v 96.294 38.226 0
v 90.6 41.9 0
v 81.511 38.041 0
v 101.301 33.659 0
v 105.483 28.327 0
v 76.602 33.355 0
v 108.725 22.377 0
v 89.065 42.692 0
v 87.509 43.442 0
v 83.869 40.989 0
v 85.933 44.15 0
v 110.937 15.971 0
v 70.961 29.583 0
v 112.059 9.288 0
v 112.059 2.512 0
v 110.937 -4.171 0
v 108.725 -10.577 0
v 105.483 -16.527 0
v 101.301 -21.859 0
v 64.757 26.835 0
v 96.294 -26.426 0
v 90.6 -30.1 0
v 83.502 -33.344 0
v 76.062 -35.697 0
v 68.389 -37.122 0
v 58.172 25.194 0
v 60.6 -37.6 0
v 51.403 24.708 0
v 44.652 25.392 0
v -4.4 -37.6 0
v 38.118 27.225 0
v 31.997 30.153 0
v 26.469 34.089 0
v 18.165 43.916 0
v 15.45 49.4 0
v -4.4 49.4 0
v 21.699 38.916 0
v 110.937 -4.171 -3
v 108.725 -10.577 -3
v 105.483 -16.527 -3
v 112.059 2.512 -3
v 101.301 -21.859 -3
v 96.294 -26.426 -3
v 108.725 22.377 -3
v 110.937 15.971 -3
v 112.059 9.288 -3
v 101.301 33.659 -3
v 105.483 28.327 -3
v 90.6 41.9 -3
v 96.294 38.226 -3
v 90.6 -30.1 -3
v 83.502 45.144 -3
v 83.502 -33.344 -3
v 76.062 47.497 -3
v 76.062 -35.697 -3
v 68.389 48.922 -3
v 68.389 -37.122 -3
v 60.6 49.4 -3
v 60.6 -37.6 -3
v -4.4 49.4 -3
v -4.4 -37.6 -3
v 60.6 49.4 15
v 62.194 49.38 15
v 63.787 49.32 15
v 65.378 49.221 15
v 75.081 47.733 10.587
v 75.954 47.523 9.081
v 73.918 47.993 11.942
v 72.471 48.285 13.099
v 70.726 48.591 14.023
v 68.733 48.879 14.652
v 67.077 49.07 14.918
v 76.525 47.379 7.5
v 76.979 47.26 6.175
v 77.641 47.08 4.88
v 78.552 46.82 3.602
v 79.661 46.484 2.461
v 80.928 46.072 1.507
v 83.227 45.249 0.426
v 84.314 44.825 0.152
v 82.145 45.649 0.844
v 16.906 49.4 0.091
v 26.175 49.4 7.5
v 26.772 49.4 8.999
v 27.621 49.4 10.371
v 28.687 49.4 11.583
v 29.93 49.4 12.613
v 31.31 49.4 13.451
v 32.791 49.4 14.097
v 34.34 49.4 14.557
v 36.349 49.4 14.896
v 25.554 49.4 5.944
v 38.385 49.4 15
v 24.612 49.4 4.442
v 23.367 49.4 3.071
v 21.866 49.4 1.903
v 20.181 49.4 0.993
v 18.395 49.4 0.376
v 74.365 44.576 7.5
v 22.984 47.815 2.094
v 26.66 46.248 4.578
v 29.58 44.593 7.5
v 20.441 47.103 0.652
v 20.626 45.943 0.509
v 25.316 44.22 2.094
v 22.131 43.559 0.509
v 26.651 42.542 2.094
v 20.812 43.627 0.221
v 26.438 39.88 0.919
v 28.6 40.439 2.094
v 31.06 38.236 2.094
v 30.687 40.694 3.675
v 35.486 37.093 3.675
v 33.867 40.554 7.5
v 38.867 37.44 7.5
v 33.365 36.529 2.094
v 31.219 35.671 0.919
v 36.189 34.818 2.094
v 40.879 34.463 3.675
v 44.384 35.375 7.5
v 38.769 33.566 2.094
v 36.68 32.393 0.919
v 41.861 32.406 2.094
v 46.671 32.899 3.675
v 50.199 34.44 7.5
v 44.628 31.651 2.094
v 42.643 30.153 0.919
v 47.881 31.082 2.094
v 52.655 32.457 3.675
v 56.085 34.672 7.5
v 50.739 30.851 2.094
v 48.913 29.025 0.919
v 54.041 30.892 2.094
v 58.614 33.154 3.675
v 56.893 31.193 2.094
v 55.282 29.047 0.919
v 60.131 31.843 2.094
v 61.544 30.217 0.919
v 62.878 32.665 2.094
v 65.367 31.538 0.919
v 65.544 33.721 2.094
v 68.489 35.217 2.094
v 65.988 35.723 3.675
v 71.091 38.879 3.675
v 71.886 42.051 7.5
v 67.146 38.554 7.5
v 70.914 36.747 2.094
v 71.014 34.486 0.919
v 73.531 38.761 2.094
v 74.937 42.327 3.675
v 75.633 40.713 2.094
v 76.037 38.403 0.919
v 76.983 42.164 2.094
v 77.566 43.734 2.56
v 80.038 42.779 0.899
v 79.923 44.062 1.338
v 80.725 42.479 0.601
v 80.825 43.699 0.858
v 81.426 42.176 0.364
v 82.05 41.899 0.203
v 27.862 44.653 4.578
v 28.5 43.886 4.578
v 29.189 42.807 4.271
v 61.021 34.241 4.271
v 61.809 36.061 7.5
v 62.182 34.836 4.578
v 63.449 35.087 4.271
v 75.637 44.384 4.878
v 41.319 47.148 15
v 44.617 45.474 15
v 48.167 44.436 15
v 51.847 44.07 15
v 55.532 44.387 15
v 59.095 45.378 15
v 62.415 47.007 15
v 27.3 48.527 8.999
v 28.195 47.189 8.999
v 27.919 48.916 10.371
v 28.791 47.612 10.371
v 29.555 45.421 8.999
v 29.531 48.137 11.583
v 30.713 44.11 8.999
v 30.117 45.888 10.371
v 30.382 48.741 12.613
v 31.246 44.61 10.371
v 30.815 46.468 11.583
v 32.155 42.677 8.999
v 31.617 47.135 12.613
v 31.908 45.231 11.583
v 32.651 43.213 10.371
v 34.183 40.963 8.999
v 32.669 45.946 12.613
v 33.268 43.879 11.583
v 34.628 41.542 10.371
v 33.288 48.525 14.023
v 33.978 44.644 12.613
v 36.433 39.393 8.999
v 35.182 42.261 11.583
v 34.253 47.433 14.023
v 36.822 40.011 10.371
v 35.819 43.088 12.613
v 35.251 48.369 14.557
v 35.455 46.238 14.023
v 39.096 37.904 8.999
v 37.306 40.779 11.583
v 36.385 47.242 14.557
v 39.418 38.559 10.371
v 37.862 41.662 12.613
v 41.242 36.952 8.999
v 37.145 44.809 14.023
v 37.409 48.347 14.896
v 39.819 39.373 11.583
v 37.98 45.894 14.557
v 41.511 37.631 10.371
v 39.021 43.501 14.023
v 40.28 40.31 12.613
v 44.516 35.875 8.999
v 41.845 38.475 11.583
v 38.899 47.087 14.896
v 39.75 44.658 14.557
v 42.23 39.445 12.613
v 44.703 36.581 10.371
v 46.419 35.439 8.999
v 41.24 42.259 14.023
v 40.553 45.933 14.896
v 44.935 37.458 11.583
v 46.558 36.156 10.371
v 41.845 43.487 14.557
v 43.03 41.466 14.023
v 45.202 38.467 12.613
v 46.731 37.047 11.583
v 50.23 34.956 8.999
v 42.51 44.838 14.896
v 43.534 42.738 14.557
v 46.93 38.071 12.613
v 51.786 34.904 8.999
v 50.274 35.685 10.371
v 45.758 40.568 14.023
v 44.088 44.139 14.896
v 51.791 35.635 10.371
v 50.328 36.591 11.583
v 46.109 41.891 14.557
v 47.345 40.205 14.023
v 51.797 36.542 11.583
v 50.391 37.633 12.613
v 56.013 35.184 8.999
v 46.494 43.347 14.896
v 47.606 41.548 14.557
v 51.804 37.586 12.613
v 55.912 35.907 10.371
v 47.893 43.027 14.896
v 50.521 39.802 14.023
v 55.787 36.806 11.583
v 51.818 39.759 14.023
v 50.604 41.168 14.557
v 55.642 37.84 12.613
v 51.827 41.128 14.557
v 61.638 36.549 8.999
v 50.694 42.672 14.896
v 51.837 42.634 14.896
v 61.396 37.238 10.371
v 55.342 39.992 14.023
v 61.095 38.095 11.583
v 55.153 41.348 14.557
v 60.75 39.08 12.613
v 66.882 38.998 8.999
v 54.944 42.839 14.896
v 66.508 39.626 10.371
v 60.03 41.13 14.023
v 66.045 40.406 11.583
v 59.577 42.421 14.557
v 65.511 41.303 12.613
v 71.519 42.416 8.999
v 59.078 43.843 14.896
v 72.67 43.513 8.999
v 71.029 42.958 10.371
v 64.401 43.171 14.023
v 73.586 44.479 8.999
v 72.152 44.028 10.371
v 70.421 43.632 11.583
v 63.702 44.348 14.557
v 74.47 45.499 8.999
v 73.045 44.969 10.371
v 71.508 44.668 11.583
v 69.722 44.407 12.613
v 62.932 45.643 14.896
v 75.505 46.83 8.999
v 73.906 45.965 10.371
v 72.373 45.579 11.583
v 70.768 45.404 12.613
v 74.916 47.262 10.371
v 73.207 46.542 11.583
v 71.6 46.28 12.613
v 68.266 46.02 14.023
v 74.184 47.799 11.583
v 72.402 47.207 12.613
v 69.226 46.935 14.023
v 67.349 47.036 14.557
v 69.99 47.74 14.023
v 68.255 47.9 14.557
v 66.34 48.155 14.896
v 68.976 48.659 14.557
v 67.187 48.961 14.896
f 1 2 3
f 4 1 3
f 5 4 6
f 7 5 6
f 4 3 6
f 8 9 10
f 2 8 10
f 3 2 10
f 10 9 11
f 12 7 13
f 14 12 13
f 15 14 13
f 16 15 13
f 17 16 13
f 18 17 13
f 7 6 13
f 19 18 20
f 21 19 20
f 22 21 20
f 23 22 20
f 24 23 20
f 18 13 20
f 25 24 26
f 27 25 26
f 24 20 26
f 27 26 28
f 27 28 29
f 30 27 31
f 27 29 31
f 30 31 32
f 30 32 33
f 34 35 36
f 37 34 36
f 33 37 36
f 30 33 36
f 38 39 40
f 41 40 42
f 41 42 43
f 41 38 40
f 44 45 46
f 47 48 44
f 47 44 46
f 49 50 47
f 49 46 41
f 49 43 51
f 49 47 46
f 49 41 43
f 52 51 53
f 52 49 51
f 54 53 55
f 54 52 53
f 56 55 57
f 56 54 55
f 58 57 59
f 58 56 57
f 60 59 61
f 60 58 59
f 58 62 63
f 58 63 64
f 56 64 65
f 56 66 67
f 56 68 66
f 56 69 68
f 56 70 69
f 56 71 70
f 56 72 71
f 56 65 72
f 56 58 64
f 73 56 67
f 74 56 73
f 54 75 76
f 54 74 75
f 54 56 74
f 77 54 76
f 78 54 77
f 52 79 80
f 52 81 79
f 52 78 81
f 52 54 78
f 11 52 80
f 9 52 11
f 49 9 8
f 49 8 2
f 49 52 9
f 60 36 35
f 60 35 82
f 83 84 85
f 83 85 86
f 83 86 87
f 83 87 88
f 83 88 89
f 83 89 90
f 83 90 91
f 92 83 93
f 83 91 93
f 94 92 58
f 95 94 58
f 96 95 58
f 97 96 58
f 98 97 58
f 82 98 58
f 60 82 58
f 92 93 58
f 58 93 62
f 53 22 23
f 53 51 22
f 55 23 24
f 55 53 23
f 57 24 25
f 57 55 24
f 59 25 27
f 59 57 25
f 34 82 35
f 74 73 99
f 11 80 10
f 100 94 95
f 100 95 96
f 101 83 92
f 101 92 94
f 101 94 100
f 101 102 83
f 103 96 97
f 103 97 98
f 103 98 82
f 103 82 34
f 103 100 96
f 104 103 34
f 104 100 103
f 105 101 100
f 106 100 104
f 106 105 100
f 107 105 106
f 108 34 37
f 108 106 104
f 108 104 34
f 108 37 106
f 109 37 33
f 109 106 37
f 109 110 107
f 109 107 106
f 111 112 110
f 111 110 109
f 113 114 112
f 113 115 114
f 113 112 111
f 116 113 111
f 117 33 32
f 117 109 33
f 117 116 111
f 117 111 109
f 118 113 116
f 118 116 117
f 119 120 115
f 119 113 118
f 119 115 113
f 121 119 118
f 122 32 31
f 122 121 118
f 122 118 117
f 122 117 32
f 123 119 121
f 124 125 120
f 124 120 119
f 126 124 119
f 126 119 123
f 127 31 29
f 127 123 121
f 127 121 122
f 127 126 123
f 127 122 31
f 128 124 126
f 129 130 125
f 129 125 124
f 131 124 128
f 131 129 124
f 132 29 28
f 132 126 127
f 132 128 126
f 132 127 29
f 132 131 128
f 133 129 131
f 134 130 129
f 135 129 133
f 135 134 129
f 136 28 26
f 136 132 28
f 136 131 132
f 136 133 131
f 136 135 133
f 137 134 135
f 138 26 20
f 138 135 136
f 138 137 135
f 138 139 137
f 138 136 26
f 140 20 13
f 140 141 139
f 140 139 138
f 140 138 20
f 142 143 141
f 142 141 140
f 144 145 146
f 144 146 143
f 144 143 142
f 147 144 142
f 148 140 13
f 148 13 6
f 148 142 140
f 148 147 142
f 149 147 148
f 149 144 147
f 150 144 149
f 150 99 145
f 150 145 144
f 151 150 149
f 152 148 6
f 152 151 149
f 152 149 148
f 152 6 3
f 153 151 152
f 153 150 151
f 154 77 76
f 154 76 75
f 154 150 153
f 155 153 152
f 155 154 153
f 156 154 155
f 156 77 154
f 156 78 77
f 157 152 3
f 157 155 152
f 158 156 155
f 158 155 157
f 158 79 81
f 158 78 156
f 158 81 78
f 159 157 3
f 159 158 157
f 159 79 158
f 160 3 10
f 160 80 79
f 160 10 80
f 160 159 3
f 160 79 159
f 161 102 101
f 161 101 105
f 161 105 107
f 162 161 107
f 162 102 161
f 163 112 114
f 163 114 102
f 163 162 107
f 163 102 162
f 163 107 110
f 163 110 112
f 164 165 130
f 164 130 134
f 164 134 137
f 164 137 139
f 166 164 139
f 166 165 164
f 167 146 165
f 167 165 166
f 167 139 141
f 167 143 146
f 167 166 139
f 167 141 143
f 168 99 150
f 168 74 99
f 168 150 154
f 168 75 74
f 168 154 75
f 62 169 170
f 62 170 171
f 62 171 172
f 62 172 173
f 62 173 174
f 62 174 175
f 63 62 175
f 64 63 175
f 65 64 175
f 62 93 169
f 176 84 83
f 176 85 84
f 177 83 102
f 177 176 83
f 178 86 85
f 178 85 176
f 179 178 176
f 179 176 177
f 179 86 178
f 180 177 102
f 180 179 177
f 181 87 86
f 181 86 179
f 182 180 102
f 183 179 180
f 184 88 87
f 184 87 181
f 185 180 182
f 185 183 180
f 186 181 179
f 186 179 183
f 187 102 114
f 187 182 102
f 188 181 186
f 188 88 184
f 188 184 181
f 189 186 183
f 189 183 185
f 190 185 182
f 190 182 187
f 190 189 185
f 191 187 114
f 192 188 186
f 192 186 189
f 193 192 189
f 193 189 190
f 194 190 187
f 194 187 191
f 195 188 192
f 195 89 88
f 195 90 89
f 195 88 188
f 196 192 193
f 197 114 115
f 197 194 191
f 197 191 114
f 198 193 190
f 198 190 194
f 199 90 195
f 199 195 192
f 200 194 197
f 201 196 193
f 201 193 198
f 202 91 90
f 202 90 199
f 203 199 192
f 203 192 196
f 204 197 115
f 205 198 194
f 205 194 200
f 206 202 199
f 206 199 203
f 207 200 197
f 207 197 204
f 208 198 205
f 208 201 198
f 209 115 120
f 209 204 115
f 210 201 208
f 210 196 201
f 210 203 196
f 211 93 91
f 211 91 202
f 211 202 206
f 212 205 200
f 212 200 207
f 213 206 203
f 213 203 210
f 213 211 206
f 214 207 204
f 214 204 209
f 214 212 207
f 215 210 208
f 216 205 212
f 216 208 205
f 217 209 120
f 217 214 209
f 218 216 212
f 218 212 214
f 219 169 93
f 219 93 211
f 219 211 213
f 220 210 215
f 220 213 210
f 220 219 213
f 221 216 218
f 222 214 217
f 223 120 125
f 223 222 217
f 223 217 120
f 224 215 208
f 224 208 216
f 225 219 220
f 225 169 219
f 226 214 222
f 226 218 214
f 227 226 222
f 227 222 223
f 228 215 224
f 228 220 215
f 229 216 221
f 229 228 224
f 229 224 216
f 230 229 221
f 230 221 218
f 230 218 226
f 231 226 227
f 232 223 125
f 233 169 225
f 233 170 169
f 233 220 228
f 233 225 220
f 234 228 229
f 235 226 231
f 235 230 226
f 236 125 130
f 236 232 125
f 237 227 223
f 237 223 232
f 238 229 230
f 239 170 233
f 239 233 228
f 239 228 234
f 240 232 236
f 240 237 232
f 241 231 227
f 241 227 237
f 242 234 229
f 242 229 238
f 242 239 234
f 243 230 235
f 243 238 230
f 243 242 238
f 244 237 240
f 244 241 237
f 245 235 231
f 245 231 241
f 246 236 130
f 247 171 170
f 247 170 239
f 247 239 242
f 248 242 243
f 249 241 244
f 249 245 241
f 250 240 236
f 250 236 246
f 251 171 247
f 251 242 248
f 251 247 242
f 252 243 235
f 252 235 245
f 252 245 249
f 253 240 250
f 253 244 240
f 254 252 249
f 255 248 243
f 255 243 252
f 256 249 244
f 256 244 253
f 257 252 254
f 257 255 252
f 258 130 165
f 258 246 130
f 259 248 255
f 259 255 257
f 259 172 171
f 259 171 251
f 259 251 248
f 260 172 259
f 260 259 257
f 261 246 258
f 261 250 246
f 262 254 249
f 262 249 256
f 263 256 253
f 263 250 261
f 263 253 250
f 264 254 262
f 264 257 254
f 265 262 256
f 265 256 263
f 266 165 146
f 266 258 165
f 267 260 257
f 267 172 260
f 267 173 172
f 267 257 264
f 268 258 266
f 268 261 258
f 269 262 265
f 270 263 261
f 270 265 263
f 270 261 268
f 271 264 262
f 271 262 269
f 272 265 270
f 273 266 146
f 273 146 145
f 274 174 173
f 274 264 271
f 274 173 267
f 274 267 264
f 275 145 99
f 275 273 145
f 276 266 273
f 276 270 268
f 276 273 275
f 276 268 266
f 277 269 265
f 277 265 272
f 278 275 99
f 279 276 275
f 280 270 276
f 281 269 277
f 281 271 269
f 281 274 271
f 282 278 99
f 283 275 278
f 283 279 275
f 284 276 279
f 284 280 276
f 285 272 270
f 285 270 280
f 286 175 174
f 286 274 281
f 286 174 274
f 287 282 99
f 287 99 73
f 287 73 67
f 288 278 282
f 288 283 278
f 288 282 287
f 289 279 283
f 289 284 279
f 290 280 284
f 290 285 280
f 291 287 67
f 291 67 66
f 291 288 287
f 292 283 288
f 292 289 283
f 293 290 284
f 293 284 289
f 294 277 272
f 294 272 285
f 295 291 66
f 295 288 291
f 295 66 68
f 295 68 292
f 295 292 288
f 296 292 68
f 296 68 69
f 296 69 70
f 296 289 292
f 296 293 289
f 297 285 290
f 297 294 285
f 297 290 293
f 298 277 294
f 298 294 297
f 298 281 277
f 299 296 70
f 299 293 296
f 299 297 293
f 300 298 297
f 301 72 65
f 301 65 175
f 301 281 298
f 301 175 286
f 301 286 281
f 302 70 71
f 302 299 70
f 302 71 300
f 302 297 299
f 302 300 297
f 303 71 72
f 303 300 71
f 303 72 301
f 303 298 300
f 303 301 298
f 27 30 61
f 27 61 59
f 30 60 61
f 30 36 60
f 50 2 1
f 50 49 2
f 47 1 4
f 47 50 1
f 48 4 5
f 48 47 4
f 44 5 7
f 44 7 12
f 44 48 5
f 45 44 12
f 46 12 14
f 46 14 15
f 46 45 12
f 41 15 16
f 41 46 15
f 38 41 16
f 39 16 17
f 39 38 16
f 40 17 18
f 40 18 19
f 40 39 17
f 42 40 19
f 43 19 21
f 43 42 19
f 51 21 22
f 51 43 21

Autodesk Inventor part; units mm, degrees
ref_plane "YZ Plane" through (0, 0, 0) normal (1, 0, 0) x (0, 1, 0)
ref_plane "XZ Plane" through (0, 0, 0) normal (0, 1, 0) x (-1, 0, 0)
ref_plane "XY Plane" through (0, 0, 0) normal (0, 0, 1) x (1, 0, 0)
sketch "Sketch1" plane through (0, 0, 0) normal (0, 0, 1) x (1, 0, 0)
  line L0 (-4.4, 49.4) -> (30, 49.4) projected
  line L1 (-4.4, -37.6) -> (30, -37.6) projected
  line L2 (-4.4, -37.6) -> (90.6, -37.6)
  line L3 (90.6, -37.6) -> (90.6, 49.4)
  line L4 (90.6, 49.4) -> (-4.4, 49.4)
  line L5 (-4.4, 49.4) -> (-4.4, -37.6)
  point P0 (0, 0)
  dimension "d0" = 95
extrude "Extrusion1" add sketch "Sketch1" against normal blind 3
sketch "Sketch2" plane through (90.6, -37.6, 0) normal (1, 0, 0) x (0, 0, -1)
  circle A0 centre (17.5922, 43.5) radius 28.5 construction
  point P0 (0, 37.6)
  dimension "d5" = 57
sketch "Sketch3" plane through (0, 0, 0) normal (0, 0, 1) x (1, 0, 0)
  line L0 (90.6, 49.4) -> (-4.4, 49.4) projected
  line L1 (-4.4, 49.4) -> (-4.4, -37.6) projected
  line L2 (-4.4, -37.6) -> (90.6, -37.6) projected
  line L3 (90.6, -37.6) -> (90.6, 49.4) projected
  line L4 (90.6, 49.4) -> (-4.4, 49.4) projected
  line L5 (-4.4, 49.4) -> (90.6, 49.4) projected
  arc A0 (25.8108, 49.4) -> (78.1488, 49.4) centre (51.9798, 64.0691) ccw
  point P0 (0, 0)
  point P1 (25.8108, 49.4)
  point P2 (78.1488, 49.4)
  dimension "d9" = 30
extrude "Extrusion2" add sketch "Sketch3" along normal blind 15 contours A0 L0
sketch "Sketch4" plane through (-4.4, 49.4, -3) normal (0, 1, 0) x (1, 0, 0)
  point P0 (4.4, -3)
fillet "Fillet2" radius 10 2 edges at (51.9798, 34.0691, 15) (51.9798, 34.0691, 0)
sketch "Sketch7" plane through (0, 0, -3) normal (0, 0, -1) x (-1, 0, 0)
  line L0 (4.4, 49.4) -> (-90.6, 49.4) projected
  line L1 (-90.6, 49.4) -> (-90.6, -37.6) projected
  line L2 (-90.6, -37.6) -> (4.4, -37.6) projected
  line L3 (4.4, -37.6) -> (4.4, 49.4) projected
  line L4 (-90.6, -37.6) -> (4.4, -37.6) projected
  arc A0 (-90.6, -30.1) -> (-60.6, -37.6) centre (-60.6, 26.15) ccw
  line L5 (-90.6, 49.4) -> (-90.6, -37.6) projected
  line L6 (-90.6, 5.9) -> (-40.6, 5.9) construction
  arc A1 (-60.6, 49.4) -> (-90.6, 41.9) centre (-60.6, -14.35) ccw
  point P0 (0, 0)
  point P1 (-60.6, -37.6)
  dimension "d11" = 30
  dimension "d12" = 7.5
  dimension "d13" = 50
extrude "Extrusion3" cut sketch "Sketch7" against normal through all contours A1 L1 L0 | L2 L1 A0
sketch "Sketch8" plane through (0, 0, -3) normal (0, 0, -1) x (-1, 0, 0)
  arc A0 (-60.6, 49.4) -> (-90.6, 41.9) centre (-60.6, -14.35) ccw projected
  line L0 (-90.6, 41.9) -> (-90.6, -30.1) projected
  arc A1 (-90.6, -30.1) -> (-60.6, -37.6) centre (-60.6, 26.15) ccw projected
  line L1 (-60.6, -37.6) -> (4.4, -37.6) projected
  line L2 (4.4, -37.6) -> (4.4, 49.4) projected
  line L3 (4.4, 49.4) -> (-60.6, 49.4) projected
  arc A2 (-90.6, -30.1) -> (-60.6, -37.6) centre (-60.6, 26.15) ccw projected
  arc A3 (-90.6, 41.9) -> (-90.6, -30.1) centre (-71.4, 5.9) ccw
  point P0 (0, 0)
extrude "Extrusion4" add sketch "Sketch8" against normal blind 3 contours L0 A3
sketch "Sketch9" plane through (0, 0, -3) normal (0, 0, -1) x (-1, 0, 0)
  line L0 (-52.7475, -27.5099) -> (-72.7475, -27.5099)
  line L1 (-72.7475, -27.5099) -> (-72.7475, -34.5099)
  line L2 (-72.7475, -34.5099) -> (-52.7475, -34.5099)
  line L3 (-52.7475, -34.5099) -> (-52.7475, -27.5099)
  line L4 (4.4, -37.6) -> (4.4, 49.4) projected
  line L5 (4.4, 5.9) -> (-145.6, 5.9) construction
  line L6 (-52.7475, 39.3099) -> (-72.7475, 39.3099)
  line L7 (-72.7475, 39.3099) -> (-72.7475, 46.3099)
  line L8 (-72.7475, 46.3099) -> (-52.7475, 46.3099)
  line L9 (-52.7475, 46.3099) -> (-52.7475, 39.3099)
  point P0 (0, 0)
  dimension "d19" = 20
  dimension "d20" = 7
  dimension "d21" = 150
extrude "Extrusion5" [suppressed]
sketch "Sketch10" plane through (0, 0, 0) normal (0, 0, 1) x (1, 0, 0)
  line L0 (0.15, 35.15) -> (22.95, 35.15) projected
  line L1 (6.4671, 26.3395) -> (10.4671, 29.307) projected
  line L2 (-4.4, 32.9) -> (30, 32.9) projected
  arc A0 (90.6, 41.9) -> (85.9332, 44.1503) centre (60.6, -14.35) ccw projected
  line L3 (15.4501, 49.4) -> (-4.4, 49.4) projected
  line L4 (-4.4, 49.4) -> (-4.4, -37.6) projected
  line L5 (-4.4, -37.6) -> (60.6, -37.6) projected
  arc A1 (60.6, -37.6) -> (90.6, -30.1) centre (60.6, 26.15) ccw projected
  arc A2 (90.6, -30.1) -> (90.6, 41.9) centre (71.4, 5.9) ccw projected
  line L6 (-4.4, 49.4) -> (60.6, 49.4) projected
  arc A3 (3.8712, 49.4) -> (-4.4, 18.2775) centre (37.3788, 23.8346) ccw
  line L7 (60.6, -37.6) -> (-4.4, -37.6) projected
  arc A4 (-4.4, 18.2775) -> (19.2096, -37.6) centre (64.8355, 14.6046) ccw
  point P0 (0, 0)
sketch "Sketch12" plane through (-4.4, 49.4, 0) normal (0, 1, 0) x (1, 0, 0)
  line L0 (36.1854, -19.7901) -> (34.9706, -16.4151) projected
  line L1 (34.9706, -16.4151) -> (30.2063, -18.8238) projected
  line L2 (29.3711, -16.5035) -> (30.2063, -18.8238) projected
  line L3 (34.1354, -14.0948) -> (29.3711, -16.5035) projected
  line L4 (34.1354, -14.0948) -> (33.0724, -11.1417) projected
  line L5 (33.0724, -11.1417) -> (62.871, 3.9237) projected
  line L6 (67.8822, -9.9981) -> (62.871, 3.9237) projected
  line L7 (38.0836, -25.0635) -> (67.8822, -9.9981) projected
  line L8 (38.0836, -25.0635) -> (37.0206, -22.1104) projected
  line L9 (37.0206, -22.1104) -> (32.2563, -24.5191) projected
  line L10 (31.4211, -22.1988) -> (32.2563, -24.5191) projected
  line L11 (36.1854, -19.7901) -> (31.4211, -22.1988) projected
  line L12 (65, -15) -> (65, 3) projected
  line L13 (0, 3) -> (65, 3) projected
  line L14 (0, 0) -> (0, 3) projected
  line L15 (19.8501, 0) -> (0, 0) projected
  line L16 (65, -15) -> (42.785, -15) projected
  point P0 (4.4, 0)
properties part number "Palma"
